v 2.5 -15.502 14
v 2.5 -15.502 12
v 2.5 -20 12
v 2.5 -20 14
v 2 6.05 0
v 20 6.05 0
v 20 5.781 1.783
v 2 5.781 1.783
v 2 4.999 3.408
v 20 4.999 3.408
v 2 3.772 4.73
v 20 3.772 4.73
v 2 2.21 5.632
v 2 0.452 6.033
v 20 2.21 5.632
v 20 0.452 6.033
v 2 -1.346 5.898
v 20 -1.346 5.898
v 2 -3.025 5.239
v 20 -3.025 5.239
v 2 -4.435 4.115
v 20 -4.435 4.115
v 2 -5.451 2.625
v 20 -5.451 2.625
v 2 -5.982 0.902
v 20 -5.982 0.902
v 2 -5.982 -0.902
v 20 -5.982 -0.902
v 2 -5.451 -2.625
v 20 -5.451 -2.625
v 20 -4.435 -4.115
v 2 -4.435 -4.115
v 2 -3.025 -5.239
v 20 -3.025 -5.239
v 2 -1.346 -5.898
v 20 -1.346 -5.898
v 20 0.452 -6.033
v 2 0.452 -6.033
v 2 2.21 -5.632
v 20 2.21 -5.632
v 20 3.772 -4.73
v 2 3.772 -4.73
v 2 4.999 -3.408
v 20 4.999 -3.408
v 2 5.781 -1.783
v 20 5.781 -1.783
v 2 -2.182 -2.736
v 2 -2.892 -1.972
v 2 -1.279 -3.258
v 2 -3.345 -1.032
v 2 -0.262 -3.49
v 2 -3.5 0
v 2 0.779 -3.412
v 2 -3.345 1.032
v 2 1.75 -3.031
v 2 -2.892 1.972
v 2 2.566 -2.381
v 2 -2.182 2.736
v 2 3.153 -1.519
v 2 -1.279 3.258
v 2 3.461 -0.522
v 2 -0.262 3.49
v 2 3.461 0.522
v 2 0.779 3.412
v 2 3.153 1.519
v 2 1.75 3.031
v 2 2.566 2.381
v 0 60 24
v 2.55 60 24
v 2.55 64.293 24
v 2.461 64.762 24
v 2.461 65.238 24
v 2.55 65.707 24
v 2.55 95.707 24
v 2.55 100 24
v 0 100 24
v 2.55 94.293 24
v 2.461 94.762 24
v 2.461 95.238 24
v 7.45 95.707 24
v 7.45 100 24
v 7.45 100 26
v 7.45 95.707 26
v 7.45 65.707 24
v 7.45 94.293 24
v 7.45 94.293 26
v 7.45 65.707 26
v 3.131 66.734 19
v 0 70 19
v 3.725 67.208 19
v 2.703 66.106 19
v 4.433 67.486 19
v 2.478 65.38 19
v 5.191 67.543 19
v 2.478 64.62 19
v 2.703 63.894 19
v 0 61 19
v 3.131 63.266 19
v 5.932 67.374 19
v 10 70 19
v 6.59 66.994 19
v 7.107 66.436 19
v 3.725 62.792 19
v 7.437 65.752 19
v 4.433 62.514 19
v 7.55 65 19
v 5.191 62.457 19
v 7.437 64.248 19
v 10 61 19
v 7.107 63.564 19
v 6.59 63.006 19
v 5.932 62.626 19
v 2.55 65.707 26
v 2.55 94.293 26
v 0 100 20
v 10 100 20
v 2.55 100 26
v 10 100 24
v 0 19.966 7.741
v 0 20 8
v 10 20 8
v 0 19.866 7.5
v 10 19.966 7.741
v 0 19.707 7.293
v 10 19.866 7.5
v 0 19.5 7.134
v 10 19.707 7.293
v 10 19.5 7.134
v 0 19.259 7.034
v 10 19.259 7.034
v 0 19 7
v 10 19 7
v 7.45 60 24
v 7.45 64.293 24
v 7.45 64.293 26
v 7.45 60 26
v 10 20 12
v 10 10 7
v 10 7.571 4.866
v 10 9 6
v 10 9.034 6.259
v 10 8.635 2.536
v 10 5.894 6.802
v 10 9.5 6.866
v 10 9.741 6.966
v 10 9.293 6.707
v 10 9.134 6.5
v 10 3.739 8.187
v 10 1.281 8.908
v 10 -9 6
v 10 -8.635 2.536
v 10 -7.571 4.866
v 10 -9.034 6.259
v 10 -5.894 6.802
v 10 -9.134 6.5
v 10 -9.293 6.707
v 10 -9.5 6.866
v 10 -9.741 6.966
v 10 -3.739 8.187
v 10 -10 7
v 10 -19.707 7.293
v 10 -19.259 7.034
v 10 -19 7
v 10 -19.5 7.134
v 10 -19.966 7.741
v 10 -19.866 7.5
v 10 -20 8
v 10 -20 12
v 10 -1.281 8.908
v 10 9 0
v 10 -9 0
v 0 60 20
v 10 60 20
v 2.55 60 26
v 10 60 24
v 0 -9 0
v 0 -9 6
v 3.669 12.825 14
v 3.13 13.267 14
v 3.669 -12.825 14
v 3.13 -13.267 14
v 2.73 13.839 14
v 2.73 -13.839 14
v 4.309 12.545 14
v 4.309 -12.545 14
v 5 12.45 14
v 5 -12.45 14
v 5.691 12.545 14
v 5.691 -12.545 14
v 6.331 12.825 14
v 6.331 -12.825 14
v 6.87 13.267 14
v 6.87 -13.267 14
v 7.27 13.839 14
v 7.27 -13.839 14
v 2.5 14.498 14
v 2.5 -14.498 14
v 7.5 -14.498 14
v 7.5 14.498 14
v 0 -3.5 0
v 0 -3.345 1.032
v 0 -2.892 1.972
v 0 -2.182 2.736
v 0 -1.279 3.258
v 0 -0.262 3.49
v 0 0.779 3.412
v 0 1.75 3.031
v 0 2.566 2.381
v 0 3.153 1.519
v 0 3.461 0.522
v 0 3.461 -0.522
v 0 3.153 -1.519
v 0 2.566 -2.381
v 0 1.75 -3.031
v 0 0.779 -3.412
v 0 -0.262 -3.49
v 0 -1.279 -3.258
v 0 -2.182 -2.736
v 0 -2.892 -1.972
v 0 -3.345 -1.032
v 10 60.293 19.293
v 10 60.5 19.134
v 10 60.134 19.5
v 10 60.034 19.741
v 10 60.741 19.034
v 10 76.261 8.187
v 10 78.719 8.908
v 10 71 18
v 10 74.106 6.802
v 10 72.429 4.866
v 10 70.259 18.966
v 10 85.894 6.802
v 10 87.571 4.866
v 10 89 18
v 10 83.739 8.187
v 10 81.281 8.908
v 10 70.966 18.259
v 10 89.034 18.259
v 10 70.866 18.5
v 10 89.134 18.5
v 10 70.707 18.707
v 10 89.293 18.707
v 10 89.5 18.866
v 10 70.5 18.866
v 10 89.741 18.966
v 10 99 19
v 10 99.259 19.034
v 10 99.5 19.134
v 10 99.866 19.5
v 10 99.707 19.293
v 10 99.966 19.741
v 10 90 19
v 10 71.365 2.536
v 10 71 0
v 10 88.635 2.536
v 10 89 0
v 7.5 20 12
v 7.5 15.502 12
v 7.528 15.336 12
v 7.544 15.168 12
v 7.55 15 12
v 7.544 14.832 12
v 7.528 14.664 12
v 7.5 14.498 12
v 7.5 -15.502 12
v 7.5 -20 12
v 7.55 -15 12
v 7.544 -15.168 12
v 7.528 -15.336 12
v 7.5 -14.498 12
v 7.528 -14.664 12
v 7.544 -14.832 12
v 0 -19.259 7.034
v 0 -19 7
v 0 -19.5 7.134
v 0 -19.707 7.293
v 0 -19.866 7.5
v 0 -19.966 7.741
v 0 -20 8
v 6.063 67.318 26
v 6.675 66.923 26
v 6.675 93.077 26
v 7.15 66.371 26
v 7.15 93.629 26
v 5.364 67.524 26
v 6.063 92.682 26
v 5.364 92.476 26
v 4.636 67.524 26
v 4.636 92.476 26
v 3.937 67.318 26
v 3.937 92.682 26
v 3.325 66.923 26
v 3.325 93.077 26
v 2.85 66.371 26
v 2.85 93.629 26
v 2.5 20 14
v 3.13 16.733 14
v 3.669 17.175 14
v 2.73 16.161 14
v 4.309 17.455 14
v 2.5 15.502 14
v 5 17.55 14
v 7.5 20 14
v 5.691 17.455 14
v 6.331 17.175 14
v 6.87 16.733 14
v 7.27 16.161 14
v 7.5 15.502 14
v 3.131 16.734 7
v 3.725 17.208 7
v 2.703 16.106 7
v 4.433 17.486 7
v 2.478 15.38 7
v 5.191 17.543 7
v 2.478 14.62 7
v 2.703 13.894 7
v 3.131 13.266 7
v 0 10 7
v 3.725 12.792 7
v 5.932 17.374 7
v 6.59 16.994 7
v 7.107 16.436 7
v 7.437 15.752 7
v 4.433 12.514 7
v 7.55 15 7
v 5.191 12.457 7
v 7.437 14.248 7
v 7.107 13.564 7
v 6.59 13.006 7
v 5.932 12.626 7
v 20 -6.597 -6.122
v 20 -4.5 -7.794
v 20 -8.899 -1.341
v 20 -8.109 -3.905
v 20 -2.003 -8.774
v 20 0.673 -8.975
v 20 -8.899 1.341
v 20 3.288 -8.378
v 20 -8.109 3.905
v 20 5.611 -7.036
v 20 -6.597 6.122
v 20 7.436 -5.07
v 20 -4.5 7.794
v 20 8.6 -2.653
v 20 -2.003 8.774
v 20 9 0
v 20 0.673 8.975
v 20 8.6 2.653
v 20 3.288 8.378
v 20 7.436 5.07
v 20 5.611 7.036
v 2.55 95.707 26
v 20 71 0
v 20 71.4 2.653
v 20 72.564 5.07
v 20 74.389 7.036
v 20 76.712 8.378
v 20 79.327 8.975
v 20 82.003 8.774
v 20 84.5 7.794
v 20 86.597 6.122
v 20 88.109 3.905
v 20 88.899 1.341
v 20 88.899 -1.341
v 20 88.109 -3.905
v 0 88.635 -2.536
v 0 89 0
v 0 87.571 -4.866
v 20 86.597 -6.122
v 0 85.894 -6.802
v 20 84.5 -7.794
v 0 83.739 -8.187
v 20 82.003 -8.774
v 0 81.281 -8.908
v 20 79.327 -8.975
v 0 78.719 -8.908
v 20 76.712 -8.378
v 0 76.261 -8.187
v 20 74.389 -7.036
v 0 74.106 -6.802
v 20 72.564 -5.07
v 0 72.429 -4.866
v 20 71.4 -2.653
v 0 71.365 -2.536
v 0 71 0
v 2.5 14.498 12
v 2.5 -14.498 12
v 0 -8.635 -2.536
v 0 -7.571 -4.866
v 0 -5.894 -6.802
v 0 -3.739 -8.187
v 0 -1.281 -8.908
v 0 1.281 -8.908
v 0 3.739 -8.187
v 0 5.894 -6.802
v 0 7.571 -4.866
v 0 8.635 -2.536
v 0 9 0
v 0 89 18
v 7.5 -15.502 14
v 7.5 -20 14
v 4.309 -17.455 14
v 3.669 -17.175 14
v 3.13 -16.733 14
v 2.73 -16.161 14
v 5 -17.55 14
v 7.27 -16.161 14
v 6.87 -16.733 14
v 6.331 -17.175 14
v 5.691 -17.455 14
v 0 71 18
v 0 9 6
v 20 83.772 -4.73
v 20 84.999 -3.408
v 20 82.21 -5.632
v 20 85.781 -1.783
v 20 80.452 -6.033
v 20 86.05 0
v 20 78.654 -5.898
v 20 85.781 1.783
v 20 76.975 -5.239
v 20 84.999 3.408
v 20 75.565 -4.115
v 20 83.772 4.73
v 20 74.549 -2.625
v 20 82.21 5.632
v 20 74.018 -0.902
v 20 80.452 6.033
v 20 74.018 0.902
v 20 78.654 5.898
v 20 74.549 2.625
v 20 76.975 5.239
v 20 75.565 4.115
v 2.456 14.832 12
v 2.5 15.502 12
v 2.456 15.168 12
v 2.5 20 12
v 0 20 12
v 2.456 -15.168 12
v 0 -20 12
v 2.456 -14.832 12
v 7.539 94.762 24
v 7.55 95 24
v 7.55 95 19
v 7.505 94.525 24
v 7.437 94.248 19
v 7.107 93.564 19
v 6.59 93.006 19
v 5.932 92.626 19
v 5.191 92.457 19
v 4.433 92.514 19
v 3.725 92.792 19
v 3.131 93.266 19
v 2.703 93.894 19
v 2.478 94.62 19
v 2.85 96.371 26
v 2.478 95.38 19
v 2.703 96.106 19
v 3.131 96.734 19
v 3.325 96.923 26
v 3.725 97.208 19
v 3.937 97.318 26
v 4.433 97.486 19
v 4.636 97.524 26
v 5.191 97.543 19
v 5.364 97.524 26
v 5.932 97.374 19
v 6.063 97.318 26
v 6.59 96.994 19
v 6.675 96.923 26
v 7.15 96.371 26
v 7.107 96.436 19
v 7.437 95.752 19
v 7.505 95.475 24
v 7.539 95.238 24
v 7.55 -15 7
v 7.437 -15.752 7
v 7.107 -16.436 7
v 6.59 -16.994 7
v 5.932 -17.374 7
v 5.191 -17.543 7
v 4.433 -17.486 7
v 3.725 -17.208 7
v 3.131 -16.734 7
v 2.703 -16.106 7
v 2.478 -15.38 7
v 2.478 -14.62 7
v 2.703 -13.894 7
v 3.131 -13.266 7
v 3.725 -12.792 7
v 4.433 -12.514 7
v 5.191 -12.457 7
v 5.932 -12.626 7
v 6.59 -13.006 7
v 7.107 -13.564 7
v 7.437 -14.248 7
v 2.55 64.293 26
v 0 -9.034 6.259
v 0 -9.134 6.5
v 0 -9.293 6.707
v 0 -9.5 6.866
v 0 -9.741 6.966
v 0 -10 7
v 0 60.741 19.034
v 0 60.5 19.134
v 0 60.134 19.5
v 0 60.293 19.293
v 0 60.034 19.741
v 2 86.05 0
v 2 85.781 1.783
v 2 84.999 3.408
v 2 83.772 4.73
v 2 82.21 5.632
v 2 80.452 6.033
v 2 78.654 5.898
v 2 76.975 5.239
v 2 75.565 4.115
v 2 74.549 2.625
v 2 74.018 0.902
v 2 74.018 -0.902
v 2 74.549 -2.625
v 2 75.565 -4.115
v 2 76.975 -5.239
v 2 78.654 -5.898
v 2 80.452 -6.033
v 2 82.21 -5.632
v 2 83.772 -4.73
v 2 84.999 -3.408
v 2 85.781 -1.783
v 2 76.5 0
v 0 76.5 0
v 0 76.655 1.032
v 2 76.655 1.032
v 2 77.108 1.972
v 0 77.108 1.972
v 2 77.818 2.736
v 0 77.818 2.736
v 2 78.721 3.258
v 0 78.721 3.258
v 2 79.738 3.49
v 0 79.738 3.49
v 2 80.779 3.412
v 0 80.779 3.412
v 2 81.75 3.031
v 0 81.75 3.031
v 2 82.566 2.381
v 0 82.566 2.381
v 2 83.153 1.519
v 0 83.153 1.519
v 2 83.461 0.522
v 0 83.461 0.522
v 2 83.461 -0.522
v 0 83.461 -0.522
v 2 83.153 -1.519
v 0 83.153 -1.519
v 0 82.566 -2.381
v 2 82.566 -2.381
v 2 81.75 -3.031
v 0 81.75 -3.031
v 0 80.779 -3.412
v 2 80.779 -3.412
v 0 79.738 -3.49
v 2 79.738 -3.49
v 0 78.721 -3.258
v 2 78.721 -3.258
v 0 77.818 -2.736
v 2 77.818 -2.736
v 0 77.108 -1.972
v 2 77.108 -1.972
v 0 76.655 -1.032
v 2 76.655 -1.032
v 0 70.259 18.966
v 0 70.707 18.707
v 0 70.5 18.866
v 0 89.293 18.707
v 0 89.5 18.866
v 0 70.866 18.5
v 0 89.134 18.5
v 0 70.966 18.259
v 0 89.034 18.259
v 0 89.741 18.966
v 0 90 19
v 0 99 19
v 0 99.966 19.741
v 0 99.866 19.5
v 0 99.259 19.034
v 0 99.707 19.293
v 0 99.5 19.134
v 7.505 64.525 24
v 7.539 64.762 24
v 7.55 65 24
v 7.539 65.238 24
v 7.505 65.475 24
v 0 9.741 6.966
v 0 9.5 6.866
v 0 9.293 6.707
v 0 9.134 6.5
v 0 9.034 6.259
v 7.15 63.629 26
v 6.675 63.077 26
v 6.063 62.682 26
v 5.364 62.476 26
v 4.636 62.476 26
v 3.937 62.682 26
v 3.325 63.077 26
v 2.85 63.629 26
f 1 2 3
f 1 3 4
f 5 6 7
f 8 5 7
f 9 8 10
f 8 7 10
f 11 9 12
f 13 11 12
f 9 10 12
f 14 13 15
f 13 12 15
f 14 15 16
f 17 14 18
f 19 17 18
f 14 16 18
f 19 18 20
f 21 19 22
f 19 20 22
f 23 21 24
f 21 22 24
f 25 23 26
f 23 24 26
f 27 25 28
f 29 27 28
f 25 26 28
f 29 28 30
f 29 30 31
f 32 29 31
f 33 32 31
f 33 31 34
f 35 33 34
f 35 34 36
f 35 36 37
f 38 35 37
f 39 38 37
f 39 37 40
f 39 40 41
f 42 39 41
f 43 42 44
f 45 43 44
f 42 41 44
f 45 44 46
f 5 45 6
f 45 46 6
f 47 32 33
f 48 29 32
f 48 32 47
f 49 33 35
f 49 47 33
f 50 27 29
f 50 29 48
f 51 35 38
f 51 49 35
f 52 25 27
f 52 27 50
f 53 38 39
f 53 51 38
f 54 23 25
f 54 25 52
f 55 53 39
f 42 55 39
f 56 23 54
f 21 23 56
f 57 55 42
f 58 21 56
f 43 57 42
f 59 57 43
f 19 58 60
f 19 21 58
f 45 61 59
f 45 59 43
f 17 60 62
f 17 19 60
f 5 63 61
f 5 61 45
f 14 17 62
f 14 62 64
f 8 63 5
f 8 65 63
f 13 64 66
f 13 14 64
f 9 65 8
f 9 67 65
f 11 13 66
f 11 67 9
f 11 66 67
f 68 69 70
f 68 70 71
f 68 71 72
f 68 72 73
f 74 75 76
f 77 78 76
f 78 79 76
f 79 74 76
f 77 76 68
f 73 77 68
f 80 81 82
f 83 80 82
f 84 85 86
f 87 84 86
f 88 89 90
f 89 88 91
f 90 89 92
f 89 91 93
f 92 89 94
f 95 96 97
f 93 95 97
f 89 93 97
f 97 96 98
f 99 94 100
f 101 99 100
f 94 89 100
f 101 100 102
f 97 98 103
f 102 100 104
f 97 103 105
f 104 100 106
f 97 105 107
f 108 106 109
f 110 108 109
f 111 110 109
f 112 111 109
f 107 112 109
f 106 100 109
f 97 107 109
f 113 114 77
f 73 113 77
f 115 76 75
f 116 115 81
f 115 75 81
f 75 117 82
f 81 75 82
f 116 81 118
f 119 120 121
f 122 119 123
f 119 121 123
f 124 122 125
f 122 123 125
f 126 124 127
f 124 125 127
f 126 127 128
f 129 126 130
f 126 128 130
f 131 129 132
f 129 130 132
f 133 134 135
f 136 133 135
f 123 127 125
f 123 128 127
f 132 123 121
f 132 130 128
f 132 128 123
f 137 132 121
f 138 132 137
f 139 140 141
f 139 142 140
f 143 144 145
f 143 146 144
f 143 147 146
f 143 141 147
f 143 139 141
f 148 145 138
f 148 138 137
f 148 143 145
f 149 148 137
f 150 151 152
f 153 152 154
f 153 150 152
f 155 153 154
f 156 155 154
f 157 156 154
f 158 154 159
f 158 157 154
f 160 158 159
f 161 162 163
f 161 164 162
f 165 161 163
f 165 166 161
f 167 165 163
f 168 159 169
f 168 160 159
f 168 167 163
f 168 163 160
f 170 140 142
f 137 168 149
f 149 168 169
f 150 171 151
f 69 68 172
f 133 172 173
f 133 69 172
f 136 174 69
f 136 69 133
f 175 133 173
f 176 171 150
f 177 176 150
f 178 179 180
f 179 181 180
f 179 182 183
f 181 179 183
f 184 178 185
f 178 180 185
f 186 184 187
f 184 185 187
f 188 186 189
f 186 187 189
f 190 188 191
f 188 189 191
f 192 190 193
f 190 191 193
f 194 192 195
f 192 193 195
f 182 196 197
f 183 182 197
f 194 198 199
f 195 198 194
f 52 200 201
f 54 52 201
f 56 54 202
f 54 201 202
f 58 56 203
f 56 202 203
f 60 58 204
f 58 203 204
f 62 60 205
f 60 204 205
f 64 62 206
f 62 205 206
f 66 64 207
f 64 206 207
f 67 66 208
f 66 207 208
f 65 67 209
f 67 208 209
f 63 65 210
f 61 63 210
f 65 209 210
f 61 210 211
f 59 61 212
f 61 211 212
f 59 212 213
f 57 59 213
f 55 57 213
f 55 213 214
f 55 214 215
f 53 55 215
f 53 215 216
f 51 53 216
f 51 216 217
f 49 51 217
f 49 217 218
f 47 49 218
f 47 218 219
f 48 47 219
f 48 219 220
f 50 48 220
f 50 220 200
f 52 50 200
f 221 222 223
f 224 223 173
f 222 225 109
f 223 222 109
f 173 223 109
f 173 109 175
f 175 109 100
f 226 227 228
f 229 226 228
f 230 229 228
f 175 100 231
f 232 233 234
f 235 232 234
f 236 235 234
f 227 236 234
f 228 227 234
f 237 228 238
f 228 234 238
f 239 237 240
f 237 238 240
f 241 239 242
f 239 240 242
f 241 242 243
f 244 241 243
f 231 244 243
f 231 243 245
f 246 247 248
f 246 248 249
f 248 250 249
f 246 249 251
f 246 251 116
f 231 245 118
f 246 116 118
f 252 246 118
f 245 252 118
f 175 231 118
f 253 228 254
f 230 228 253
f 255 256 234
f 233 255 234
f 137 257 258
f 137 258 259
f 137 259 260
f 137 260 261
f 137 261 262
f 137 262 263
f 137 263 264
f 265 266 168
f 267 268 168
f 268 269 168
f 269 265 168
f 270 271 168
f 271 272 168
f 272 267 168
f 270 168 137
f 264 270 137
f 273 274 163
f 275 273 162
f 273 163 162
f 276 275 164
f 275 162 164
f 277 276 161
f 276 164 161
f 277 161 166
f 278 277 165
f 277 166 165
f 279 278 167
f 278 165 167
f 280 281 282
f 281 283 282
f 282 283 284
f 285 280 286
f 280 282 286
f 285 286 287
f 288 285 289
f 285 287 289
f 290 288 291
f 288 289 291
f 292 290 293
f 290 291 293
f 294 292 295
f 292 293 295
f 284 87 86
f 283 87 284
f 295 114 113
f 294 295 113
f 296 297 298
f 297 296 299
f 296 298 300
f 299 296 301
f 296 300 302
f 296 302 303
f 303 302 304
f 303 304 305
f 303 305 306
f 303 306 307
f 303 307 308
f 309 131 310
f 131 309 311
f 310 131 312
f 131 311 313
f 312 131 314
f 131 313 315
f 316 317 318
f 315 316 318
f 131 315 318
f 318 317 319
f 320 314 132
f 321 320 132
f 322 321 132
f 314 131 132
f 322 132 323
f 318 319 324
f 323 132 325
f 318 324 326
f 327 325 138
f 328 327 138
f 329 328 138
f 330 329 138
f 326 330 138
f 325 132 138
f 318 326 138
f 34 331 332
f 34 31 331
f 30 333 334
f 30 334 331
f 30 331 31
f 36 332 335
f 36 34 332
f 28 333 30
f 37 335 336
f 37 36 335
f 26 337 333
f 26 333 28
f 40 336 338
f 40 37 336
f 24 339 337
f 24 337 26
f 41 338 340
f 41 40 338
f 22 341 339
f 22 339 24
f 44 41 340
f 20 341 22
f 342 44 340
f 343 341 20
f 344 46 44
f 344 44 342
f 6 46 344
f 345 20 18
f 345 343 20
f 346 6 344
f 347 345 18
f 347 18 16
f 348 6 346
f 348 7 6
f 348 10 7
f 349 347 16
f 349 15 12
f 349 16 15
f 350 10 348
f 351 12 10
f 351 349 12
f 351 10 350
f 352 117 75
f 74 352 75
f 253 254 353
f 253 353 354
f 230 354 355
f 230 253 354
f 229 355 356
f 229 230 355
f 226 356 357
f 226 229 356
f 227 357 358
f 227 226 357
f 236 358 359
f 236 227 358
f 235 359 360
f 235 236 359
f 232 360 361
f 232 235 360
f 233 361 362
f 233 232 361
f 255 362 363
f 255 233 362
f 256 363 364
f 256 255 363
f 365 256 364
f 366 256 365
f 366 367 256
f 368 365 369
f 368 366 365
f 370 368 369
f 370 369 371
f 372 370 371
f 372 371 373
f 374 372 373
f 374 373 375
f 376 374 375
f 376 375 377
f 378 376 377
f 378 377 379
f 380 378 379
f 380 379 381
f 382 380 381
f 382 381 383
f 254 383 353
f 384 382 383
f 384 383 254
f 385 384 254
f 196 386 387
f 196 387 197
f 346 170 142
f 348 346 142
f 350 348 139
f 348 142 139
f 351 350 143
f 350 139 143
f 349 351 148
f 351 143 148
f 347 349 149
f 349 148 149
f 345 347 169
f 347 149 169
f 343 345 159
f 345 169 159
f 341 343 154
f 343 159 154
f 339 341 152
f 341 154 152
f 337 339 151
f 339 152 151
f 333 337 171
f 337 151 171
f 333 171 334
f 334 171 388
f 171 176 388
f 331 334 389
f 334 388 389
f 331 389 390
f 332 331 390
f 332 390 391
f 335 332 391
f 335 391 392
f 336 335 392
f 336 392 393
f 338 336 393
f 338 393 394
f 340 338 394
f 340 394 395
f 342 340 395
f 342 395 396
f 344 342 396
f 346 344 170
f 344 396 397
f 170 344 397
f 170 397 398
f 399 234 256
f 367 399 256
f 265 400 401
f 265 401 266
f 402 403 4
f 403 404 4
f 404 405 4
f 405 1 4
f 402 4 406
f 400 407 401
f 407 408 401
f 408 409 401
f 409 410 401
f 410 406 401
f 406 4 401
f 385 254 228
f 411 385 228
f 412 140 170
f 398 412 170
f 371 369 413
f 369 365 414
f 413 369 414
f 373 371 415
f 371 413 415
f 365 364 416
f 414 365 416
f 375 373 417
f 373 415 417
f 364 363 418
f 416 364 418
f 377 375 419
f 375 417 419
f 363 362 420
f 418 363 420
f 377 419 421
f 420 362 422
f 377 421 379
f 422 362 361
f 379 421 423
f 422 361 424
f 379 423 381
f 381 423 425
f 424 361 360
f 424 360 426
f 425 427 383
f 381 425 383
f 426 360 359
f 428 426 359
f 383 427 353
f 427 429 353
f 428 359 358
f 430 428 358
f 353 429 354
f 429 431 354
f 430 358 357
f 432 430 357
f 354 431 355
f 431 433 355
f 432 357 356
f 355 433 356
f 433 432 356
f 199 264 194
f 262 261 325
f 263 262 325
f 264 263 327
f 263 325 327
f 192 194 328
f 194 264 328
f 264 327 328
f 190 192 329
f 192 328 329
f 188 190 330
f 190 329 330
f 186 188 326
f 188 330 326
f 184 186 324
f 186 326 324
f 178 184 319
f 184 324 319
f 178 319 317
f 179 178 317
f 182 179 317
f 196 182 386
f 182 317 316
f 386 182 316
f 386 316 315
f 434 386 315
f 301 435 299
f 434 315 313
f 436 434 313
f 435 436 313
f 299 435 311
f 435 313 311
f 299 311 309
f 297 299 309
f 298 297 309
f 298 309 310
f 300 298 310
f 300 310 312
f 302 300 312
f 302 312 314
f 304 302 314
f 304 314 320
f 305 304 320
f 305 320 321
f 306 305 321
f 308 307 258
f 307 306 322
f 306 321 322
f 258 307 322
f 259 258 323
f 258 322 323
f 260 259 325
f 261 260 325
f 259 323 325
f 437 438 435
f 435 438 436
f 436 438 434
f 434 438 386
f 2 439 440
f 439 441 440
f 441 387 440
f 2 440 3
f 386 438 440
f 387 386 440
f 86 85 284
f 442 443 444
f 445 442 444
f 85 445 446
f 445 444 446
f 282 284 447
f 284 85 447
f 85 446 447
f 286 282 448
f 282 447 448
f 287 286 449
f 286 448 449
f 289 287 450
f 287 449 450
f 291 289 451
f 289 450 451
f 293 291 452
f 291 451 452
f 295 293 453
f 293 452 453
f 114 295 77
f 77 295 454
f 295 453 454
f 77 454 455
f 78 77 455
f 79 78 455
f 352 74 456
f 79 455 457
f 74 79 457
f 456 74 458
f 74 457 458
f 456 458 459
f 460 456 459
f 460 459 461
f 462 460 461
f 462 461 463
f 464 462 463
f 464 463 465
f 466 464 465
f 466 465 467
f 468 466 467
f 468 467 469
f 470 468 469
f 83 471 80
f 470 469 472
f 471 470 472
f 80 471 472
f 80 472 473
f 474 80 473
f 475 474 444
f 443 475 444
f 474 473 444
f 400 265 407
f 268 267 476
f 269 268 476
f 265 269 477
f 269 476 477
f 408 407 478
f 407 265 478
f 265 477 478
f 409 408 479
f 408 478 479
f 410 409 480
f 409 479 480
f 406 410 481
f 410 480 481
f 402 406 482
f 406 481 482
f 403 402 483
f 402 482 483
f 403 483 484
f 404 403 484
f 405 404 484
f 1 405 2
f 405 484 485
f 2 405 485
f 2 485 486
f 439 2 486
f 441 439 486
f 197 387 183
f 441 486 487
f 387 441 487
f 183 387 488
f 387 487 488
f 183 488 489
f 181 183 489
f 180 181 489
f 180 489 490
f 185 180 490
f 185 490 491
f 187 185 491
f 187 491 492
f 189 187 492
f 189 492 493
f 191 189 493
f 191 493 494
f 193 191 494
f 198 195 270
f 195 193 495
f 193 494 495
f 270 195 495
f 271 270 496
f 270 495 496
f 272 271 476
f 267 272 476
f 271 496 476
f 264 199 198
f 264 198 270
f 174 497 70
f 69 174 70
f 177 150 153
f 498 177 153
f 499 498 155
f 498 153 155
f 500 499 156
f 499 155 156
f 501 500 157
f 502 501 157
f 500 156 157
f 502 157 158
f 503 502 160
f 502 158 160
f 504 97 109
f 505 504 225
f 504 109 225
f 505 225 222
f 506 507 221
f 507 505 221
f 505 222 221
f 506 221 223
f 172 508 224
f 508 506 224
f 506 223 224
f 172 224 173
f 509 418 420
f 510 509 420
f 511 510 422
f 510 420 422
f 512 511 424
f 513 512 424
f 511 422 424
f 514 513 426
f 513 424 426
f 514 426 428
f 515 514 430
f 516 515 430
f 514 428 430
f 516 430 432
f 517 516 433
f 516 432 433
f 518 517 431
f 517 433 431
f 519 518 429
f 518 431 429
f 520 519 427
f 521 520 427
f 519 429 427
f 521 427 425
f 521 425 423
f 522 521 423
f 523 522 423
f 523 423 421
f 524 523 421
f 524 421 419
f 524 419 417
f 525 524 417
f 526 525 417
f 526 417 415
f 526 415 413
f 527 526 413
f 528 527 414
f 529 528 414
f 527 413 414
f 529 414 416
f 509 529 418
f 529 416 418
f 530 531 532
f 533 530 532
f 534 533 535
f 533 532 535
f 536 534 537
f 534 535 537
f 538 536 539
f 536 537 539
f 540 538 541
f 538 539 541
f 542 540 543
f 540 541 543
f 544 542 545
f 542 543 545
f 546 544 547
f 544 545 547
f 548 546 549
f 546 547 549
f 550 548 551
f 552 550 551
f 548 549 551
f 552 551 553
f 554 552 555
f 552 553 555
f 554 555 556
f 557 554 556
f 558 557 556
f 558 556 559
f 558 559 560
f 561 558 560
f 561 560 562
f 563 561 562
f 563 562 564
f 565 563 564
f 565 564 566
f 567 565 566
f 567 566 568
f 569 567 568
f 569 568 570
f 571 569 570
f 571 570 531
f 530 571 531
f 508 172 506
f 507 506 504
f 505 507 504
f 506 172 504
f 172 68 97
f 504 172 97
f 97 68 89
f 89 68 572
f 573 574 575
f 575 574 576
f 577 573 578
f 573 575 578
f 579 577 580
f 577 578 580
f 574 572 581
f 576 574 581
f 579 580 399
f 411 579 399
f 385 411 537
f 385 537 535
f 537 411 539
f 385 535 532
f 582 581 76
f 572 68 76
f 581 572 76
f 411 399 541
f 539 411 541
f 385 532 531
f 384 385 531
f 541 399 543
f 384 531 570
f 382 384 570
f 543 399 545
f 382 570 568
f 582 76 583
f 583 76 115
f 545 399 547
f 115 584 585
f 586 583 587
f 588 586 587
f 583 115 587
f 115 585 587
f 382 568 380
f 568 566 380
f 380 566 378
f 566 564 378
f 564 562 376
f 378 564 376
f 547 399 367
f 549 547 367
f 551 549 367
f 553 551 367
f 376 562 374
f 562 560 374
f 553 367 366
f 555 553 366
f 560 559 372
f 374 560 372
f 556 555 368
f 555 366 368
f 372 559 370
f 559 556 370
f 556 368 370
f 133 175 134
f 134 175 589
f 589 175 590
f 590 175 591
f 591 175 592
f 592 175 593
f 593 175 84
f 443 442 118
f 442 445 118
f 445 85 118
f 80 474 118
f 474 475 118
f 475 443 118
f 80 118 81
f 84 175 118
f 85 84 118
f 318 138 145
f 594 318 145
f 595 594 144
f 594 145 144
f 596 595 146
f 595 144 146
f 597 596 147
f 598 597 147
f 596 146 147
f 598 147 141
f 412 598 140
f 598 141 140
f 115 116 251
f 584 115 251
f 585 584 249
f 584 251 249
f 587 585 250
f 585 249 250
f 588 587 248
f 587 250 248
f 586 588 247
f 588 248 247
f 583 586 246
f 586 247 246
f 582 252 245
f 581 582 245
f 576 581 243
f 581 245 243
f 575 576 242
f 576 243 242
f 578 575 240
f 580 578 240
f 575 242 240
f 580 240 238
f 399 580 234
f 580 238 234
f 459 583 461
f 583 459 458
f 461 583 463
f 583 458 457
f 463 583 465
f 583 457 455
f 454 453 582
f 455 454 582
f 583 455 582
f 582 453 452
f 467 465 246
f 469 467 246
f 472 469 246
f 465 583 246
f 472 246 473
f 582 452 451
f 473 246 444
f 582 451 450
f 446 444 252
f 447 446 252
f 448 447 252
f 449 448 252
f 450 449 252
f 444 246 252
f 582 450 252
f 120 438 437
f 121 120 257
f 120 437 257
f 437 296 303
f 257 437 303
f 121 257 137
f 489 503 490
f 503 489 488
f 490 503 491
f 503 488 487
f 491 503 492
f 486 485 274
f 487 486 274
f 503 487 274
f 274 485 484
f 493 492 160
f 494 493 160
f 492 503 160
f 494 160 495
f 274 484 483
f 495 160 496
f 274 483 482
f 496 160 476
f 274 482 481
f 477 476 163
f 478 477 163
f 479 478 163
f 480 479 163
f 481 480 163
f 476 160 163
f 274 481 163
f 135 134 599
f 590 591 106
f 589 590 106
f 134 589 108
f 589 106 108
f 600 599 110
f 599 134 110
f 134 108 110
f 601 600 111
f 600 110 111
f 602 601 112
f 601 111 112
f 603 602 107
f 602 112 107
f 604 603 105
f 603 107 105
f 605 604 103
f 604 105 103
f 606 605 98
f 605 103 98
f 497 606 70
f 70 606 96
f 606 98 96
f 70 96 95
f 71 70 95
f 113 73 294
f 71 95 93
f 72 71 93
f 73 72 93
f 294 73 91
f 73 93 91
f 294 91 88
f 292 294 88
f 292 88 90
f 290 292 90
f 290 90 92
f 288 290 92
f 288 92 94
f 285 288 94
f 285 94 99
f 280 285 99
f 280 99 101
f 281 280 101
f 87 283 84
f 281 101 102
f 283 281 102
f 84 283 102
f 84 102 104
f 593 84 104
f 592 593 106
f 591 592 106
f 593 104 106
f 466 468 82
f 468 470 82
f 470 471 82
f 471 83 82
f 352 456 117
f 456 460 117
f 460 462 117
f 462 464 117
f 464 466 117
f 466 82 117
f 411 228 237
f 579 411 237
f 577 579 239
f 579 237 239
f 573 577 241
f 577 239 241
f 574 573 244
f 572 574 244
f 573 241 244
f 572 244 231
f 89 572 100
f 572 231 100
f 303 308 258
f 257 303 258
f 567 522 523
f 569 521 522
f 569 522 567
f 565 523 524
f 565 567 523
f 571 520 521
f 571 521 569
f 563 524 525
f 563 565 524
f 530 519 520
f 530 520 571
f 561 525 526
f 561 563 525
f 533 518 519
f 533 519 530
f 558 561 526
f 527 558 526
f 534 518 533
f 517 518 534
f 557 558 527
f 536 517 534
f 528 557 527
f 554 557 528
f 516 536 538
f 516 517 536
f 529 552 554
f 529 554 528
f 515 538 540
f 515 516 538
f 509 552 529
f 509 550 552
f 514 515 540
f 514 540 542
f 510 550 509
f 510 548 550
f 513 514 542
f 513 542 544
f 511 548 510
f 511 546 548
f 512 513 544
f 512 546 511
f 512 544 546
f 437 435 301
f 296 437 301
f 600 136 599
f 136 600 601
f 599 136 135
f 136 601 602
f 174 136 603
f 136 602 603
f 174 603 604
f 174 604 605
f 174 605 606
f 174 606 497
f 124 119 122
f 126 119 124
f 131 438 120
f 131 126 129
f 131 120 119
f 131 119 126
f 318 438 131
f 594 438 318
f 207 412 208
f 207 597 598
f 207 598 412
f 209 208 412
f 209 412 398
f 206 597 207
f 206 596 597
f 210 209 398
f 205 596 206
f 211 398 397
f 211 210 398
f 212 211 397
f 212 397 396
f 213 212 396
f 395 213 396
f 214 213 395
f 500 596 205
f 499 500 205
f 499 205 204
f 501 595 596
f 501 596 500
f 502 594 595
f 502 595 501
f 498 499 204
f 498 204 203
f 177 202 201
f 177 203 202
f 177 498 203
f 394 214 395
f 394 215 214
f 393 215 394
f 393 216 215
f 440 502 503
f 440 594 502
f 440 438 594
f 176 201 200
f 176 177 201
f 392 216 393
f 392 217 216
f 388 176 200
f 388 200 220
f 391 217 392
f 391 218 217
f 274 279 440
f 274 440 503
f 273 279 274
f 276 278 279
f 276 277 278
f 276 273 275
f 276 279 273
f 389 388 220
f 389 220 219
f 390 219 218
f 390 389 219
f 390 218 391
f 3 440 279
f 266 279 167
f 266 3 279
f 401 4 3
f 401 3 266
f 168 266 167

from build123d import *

# Parameters (mm, degrees)
F0_R      = 9
F1_DEPTH  = 20
F4_DEPTH  = 20
F7_DEPTH  = 40
F9_DEPTH  = 25
F10_R     = 6.05
F11_DEPTH = 18
F12_R     = 3.5
F13_DEPTH = 25
F14_R     = 2.55
F15_DEPTH = 19.001


with BuildPart() as f1:
    # F0 (on Right) → F1 (new body)
    with BuildSketch(Plane.YZ):
        Circle(F0_R)
    extrude(amount=F1_DEPTH)

    # F3 (on Front) → F4 (join, symmetric)
    with BuildSketch(Plane.XZ):
        Polygon((2.55, 24), (0, 24), (0, 0), (10, 0), (10, 24), (7.45, 24), (7.45, 26), (2.55, 26), align=None)
    extrude(amount=F4_DEPTH, both=True)


with BuildPart() as f5_1:
    # F5: instance of F1
    add(f1.part.mirror(Plane.XZ.offset(-40)))


with BuildPart() as f1_1:
    add(f1.part)

    # F6 (on face) → F7 (cut)
    with BuildSketch(Plane.XZ.offset(20)):
        Polygon((0, 26), (0, 12), (2.5, 12), (2.5, 14), (7.5, 14), (7.5, 12), (10, 12), (10, 26), align=None)
    extrude(amount=-F7_DEPTH, mode=Mode.SUBTRACT)


with BuildPart() as f9_tool:
    # F8 (on face) → F9 (new body)
    with BuildSketch(Plane.YZ.offset(10)):
        with BuildLine():
            Line((-10, 7), (-19, 7))
            ThreePointArc((-19, 7), (-19.7071067812, 7.2928932188), (-20, 8))
            Line((-20, 8), (-20, 0))
            Line((-20, 0), (-9, 0))
            Line((-9, 0), (-9, 6))
            ThreePointArc((-9, 6), (-9.2928932188, 6.7071067812), (-10, 7))
        make_face()
        with BuildLine():
            ThreePointArc((10, 7), (9.2928932188, 6.7071067812), (9, 6))
            Line((9, 6), (9, 0))
            Line((9, 0), (20, 0))
            Line((20, 0), (20, 8))
            ThreePointArc((20, 8), (19.7071067812, 7.2928932188), (19, 7))
            Line((19, 7), (10, 7))
        make_face()
        with BuildLine():
            ThreePointArc((61, 19), (60.2928932188, 19.2928932188), (60, 20))
            Line((60, 20), (60, 0))
            Line((60, 0), (71, 0))
            Line((71, 0), (71, 18))
            ThreePointArc((71, 18), (70.7071067812, 18.7071067812), (70, 19))
            Line((70, 19), (61, 19))
        make_face()
        with BuildLine():
            Line((100, 0), (100, 20))
            ThreePointArc((100, 20), (99.7071067812, 19.2928932188), (99, 19))
            Line((99, 19), (90, 19))
            ThreePointArc((90, 19), (89.2928932188, 18.7071067812), (89, 18))
            Line((89, 18), (89, 0))
            Line((89, 0), (100, 0))
        make_face()
    extrude(amount=-F9_DEPTH)


with BuildPart() as f1_2:
    add(f1_1.part)

    # F9: cut by f9_tool
    add(f9_tool.part, mode=Mode.SUBTRACT)


with BuildPart() as f5_1_1:
    add(f5_1.part)

    # F9: cut by f9_tool
    add(f9_tool.part, mode=Mode.SUBTRACT)


with BuildPart() as f11_tool:
    # F10 (on face) → F11 (new body)
    with BuildSketch(Plane.YZ.offset(20)):
        Circle(F10_R)
        with Locations((80, 0)):
            Circle(F10_R)
    extrude(amount=-F11_DEPTH)


with BuildPart() as f1_3:
    add(f1_2.part)

    # F11: cut by f11_tool
    add(f11_tool.part, mode=Mode.SUBTRACT)


with BuildPart() as f5_1_2:
    add(f5_1_1.part)

    # F11: cut by f11_tool
    add(f11_tool.part, mode=Mode.SUBTRACT)


with BuildPart() as f13_tool:
    # F12 (on face) → F13 (new body)
    with BuildSketch(Plane(origin=(0, 0, 0), x_dir=(0, -1, 0), z_dir=(-1, 0, 0))):
        Circle(F12_R)
        with Locations((-80, 0)):
            Circle(F12_R)
    extrude(amount=-F13_DEPTH)


with BuildPart() as f1_4:
    add(f1_3.part)

    # F13: cut by f13_tool
    add(f13_tool.part, mode=Mode.SUBTRACT)


with BuildPart() as f5_1_3:
    add(f5_1_2.part)

    # F13: cut by f13_tool
    add(f13_tool.part, mode=Mode.SUBTRACT)


with BuildPart() as f15_tool:
    # F14 (on face) → F15 (new body, through all)
    with BuildSketch(Plane(origin=(0, 0, 7), x_dir=(1, 0, 0), z_dir=(0, 0, -1))):
        with Locations((5, 15)):
            Circle(F14_R)
        with Locations((5, -15)):
            Circle(F14_R)
        with Locations((5, -65)):
            Circle(F14_R)
        with Locations((5, -95)):
            Circle(F14_R)
    extrude(amount=-F15_DEPTH)


with BuildPart() as f1_5:
    add(f1_4.part)

    # F15: cut by f15_tool
    add(f15_tool.part, mode=Mode.SUBTRACT)


with BuildPart() as f5_1_4:
    add(f5_1_3.part)

    # F15: cut by f15_tool
    add(f15_tool.part, mode=Mode.SUBTRACT)


solid = Compound([f1_5.part, f5_1_4.part])
